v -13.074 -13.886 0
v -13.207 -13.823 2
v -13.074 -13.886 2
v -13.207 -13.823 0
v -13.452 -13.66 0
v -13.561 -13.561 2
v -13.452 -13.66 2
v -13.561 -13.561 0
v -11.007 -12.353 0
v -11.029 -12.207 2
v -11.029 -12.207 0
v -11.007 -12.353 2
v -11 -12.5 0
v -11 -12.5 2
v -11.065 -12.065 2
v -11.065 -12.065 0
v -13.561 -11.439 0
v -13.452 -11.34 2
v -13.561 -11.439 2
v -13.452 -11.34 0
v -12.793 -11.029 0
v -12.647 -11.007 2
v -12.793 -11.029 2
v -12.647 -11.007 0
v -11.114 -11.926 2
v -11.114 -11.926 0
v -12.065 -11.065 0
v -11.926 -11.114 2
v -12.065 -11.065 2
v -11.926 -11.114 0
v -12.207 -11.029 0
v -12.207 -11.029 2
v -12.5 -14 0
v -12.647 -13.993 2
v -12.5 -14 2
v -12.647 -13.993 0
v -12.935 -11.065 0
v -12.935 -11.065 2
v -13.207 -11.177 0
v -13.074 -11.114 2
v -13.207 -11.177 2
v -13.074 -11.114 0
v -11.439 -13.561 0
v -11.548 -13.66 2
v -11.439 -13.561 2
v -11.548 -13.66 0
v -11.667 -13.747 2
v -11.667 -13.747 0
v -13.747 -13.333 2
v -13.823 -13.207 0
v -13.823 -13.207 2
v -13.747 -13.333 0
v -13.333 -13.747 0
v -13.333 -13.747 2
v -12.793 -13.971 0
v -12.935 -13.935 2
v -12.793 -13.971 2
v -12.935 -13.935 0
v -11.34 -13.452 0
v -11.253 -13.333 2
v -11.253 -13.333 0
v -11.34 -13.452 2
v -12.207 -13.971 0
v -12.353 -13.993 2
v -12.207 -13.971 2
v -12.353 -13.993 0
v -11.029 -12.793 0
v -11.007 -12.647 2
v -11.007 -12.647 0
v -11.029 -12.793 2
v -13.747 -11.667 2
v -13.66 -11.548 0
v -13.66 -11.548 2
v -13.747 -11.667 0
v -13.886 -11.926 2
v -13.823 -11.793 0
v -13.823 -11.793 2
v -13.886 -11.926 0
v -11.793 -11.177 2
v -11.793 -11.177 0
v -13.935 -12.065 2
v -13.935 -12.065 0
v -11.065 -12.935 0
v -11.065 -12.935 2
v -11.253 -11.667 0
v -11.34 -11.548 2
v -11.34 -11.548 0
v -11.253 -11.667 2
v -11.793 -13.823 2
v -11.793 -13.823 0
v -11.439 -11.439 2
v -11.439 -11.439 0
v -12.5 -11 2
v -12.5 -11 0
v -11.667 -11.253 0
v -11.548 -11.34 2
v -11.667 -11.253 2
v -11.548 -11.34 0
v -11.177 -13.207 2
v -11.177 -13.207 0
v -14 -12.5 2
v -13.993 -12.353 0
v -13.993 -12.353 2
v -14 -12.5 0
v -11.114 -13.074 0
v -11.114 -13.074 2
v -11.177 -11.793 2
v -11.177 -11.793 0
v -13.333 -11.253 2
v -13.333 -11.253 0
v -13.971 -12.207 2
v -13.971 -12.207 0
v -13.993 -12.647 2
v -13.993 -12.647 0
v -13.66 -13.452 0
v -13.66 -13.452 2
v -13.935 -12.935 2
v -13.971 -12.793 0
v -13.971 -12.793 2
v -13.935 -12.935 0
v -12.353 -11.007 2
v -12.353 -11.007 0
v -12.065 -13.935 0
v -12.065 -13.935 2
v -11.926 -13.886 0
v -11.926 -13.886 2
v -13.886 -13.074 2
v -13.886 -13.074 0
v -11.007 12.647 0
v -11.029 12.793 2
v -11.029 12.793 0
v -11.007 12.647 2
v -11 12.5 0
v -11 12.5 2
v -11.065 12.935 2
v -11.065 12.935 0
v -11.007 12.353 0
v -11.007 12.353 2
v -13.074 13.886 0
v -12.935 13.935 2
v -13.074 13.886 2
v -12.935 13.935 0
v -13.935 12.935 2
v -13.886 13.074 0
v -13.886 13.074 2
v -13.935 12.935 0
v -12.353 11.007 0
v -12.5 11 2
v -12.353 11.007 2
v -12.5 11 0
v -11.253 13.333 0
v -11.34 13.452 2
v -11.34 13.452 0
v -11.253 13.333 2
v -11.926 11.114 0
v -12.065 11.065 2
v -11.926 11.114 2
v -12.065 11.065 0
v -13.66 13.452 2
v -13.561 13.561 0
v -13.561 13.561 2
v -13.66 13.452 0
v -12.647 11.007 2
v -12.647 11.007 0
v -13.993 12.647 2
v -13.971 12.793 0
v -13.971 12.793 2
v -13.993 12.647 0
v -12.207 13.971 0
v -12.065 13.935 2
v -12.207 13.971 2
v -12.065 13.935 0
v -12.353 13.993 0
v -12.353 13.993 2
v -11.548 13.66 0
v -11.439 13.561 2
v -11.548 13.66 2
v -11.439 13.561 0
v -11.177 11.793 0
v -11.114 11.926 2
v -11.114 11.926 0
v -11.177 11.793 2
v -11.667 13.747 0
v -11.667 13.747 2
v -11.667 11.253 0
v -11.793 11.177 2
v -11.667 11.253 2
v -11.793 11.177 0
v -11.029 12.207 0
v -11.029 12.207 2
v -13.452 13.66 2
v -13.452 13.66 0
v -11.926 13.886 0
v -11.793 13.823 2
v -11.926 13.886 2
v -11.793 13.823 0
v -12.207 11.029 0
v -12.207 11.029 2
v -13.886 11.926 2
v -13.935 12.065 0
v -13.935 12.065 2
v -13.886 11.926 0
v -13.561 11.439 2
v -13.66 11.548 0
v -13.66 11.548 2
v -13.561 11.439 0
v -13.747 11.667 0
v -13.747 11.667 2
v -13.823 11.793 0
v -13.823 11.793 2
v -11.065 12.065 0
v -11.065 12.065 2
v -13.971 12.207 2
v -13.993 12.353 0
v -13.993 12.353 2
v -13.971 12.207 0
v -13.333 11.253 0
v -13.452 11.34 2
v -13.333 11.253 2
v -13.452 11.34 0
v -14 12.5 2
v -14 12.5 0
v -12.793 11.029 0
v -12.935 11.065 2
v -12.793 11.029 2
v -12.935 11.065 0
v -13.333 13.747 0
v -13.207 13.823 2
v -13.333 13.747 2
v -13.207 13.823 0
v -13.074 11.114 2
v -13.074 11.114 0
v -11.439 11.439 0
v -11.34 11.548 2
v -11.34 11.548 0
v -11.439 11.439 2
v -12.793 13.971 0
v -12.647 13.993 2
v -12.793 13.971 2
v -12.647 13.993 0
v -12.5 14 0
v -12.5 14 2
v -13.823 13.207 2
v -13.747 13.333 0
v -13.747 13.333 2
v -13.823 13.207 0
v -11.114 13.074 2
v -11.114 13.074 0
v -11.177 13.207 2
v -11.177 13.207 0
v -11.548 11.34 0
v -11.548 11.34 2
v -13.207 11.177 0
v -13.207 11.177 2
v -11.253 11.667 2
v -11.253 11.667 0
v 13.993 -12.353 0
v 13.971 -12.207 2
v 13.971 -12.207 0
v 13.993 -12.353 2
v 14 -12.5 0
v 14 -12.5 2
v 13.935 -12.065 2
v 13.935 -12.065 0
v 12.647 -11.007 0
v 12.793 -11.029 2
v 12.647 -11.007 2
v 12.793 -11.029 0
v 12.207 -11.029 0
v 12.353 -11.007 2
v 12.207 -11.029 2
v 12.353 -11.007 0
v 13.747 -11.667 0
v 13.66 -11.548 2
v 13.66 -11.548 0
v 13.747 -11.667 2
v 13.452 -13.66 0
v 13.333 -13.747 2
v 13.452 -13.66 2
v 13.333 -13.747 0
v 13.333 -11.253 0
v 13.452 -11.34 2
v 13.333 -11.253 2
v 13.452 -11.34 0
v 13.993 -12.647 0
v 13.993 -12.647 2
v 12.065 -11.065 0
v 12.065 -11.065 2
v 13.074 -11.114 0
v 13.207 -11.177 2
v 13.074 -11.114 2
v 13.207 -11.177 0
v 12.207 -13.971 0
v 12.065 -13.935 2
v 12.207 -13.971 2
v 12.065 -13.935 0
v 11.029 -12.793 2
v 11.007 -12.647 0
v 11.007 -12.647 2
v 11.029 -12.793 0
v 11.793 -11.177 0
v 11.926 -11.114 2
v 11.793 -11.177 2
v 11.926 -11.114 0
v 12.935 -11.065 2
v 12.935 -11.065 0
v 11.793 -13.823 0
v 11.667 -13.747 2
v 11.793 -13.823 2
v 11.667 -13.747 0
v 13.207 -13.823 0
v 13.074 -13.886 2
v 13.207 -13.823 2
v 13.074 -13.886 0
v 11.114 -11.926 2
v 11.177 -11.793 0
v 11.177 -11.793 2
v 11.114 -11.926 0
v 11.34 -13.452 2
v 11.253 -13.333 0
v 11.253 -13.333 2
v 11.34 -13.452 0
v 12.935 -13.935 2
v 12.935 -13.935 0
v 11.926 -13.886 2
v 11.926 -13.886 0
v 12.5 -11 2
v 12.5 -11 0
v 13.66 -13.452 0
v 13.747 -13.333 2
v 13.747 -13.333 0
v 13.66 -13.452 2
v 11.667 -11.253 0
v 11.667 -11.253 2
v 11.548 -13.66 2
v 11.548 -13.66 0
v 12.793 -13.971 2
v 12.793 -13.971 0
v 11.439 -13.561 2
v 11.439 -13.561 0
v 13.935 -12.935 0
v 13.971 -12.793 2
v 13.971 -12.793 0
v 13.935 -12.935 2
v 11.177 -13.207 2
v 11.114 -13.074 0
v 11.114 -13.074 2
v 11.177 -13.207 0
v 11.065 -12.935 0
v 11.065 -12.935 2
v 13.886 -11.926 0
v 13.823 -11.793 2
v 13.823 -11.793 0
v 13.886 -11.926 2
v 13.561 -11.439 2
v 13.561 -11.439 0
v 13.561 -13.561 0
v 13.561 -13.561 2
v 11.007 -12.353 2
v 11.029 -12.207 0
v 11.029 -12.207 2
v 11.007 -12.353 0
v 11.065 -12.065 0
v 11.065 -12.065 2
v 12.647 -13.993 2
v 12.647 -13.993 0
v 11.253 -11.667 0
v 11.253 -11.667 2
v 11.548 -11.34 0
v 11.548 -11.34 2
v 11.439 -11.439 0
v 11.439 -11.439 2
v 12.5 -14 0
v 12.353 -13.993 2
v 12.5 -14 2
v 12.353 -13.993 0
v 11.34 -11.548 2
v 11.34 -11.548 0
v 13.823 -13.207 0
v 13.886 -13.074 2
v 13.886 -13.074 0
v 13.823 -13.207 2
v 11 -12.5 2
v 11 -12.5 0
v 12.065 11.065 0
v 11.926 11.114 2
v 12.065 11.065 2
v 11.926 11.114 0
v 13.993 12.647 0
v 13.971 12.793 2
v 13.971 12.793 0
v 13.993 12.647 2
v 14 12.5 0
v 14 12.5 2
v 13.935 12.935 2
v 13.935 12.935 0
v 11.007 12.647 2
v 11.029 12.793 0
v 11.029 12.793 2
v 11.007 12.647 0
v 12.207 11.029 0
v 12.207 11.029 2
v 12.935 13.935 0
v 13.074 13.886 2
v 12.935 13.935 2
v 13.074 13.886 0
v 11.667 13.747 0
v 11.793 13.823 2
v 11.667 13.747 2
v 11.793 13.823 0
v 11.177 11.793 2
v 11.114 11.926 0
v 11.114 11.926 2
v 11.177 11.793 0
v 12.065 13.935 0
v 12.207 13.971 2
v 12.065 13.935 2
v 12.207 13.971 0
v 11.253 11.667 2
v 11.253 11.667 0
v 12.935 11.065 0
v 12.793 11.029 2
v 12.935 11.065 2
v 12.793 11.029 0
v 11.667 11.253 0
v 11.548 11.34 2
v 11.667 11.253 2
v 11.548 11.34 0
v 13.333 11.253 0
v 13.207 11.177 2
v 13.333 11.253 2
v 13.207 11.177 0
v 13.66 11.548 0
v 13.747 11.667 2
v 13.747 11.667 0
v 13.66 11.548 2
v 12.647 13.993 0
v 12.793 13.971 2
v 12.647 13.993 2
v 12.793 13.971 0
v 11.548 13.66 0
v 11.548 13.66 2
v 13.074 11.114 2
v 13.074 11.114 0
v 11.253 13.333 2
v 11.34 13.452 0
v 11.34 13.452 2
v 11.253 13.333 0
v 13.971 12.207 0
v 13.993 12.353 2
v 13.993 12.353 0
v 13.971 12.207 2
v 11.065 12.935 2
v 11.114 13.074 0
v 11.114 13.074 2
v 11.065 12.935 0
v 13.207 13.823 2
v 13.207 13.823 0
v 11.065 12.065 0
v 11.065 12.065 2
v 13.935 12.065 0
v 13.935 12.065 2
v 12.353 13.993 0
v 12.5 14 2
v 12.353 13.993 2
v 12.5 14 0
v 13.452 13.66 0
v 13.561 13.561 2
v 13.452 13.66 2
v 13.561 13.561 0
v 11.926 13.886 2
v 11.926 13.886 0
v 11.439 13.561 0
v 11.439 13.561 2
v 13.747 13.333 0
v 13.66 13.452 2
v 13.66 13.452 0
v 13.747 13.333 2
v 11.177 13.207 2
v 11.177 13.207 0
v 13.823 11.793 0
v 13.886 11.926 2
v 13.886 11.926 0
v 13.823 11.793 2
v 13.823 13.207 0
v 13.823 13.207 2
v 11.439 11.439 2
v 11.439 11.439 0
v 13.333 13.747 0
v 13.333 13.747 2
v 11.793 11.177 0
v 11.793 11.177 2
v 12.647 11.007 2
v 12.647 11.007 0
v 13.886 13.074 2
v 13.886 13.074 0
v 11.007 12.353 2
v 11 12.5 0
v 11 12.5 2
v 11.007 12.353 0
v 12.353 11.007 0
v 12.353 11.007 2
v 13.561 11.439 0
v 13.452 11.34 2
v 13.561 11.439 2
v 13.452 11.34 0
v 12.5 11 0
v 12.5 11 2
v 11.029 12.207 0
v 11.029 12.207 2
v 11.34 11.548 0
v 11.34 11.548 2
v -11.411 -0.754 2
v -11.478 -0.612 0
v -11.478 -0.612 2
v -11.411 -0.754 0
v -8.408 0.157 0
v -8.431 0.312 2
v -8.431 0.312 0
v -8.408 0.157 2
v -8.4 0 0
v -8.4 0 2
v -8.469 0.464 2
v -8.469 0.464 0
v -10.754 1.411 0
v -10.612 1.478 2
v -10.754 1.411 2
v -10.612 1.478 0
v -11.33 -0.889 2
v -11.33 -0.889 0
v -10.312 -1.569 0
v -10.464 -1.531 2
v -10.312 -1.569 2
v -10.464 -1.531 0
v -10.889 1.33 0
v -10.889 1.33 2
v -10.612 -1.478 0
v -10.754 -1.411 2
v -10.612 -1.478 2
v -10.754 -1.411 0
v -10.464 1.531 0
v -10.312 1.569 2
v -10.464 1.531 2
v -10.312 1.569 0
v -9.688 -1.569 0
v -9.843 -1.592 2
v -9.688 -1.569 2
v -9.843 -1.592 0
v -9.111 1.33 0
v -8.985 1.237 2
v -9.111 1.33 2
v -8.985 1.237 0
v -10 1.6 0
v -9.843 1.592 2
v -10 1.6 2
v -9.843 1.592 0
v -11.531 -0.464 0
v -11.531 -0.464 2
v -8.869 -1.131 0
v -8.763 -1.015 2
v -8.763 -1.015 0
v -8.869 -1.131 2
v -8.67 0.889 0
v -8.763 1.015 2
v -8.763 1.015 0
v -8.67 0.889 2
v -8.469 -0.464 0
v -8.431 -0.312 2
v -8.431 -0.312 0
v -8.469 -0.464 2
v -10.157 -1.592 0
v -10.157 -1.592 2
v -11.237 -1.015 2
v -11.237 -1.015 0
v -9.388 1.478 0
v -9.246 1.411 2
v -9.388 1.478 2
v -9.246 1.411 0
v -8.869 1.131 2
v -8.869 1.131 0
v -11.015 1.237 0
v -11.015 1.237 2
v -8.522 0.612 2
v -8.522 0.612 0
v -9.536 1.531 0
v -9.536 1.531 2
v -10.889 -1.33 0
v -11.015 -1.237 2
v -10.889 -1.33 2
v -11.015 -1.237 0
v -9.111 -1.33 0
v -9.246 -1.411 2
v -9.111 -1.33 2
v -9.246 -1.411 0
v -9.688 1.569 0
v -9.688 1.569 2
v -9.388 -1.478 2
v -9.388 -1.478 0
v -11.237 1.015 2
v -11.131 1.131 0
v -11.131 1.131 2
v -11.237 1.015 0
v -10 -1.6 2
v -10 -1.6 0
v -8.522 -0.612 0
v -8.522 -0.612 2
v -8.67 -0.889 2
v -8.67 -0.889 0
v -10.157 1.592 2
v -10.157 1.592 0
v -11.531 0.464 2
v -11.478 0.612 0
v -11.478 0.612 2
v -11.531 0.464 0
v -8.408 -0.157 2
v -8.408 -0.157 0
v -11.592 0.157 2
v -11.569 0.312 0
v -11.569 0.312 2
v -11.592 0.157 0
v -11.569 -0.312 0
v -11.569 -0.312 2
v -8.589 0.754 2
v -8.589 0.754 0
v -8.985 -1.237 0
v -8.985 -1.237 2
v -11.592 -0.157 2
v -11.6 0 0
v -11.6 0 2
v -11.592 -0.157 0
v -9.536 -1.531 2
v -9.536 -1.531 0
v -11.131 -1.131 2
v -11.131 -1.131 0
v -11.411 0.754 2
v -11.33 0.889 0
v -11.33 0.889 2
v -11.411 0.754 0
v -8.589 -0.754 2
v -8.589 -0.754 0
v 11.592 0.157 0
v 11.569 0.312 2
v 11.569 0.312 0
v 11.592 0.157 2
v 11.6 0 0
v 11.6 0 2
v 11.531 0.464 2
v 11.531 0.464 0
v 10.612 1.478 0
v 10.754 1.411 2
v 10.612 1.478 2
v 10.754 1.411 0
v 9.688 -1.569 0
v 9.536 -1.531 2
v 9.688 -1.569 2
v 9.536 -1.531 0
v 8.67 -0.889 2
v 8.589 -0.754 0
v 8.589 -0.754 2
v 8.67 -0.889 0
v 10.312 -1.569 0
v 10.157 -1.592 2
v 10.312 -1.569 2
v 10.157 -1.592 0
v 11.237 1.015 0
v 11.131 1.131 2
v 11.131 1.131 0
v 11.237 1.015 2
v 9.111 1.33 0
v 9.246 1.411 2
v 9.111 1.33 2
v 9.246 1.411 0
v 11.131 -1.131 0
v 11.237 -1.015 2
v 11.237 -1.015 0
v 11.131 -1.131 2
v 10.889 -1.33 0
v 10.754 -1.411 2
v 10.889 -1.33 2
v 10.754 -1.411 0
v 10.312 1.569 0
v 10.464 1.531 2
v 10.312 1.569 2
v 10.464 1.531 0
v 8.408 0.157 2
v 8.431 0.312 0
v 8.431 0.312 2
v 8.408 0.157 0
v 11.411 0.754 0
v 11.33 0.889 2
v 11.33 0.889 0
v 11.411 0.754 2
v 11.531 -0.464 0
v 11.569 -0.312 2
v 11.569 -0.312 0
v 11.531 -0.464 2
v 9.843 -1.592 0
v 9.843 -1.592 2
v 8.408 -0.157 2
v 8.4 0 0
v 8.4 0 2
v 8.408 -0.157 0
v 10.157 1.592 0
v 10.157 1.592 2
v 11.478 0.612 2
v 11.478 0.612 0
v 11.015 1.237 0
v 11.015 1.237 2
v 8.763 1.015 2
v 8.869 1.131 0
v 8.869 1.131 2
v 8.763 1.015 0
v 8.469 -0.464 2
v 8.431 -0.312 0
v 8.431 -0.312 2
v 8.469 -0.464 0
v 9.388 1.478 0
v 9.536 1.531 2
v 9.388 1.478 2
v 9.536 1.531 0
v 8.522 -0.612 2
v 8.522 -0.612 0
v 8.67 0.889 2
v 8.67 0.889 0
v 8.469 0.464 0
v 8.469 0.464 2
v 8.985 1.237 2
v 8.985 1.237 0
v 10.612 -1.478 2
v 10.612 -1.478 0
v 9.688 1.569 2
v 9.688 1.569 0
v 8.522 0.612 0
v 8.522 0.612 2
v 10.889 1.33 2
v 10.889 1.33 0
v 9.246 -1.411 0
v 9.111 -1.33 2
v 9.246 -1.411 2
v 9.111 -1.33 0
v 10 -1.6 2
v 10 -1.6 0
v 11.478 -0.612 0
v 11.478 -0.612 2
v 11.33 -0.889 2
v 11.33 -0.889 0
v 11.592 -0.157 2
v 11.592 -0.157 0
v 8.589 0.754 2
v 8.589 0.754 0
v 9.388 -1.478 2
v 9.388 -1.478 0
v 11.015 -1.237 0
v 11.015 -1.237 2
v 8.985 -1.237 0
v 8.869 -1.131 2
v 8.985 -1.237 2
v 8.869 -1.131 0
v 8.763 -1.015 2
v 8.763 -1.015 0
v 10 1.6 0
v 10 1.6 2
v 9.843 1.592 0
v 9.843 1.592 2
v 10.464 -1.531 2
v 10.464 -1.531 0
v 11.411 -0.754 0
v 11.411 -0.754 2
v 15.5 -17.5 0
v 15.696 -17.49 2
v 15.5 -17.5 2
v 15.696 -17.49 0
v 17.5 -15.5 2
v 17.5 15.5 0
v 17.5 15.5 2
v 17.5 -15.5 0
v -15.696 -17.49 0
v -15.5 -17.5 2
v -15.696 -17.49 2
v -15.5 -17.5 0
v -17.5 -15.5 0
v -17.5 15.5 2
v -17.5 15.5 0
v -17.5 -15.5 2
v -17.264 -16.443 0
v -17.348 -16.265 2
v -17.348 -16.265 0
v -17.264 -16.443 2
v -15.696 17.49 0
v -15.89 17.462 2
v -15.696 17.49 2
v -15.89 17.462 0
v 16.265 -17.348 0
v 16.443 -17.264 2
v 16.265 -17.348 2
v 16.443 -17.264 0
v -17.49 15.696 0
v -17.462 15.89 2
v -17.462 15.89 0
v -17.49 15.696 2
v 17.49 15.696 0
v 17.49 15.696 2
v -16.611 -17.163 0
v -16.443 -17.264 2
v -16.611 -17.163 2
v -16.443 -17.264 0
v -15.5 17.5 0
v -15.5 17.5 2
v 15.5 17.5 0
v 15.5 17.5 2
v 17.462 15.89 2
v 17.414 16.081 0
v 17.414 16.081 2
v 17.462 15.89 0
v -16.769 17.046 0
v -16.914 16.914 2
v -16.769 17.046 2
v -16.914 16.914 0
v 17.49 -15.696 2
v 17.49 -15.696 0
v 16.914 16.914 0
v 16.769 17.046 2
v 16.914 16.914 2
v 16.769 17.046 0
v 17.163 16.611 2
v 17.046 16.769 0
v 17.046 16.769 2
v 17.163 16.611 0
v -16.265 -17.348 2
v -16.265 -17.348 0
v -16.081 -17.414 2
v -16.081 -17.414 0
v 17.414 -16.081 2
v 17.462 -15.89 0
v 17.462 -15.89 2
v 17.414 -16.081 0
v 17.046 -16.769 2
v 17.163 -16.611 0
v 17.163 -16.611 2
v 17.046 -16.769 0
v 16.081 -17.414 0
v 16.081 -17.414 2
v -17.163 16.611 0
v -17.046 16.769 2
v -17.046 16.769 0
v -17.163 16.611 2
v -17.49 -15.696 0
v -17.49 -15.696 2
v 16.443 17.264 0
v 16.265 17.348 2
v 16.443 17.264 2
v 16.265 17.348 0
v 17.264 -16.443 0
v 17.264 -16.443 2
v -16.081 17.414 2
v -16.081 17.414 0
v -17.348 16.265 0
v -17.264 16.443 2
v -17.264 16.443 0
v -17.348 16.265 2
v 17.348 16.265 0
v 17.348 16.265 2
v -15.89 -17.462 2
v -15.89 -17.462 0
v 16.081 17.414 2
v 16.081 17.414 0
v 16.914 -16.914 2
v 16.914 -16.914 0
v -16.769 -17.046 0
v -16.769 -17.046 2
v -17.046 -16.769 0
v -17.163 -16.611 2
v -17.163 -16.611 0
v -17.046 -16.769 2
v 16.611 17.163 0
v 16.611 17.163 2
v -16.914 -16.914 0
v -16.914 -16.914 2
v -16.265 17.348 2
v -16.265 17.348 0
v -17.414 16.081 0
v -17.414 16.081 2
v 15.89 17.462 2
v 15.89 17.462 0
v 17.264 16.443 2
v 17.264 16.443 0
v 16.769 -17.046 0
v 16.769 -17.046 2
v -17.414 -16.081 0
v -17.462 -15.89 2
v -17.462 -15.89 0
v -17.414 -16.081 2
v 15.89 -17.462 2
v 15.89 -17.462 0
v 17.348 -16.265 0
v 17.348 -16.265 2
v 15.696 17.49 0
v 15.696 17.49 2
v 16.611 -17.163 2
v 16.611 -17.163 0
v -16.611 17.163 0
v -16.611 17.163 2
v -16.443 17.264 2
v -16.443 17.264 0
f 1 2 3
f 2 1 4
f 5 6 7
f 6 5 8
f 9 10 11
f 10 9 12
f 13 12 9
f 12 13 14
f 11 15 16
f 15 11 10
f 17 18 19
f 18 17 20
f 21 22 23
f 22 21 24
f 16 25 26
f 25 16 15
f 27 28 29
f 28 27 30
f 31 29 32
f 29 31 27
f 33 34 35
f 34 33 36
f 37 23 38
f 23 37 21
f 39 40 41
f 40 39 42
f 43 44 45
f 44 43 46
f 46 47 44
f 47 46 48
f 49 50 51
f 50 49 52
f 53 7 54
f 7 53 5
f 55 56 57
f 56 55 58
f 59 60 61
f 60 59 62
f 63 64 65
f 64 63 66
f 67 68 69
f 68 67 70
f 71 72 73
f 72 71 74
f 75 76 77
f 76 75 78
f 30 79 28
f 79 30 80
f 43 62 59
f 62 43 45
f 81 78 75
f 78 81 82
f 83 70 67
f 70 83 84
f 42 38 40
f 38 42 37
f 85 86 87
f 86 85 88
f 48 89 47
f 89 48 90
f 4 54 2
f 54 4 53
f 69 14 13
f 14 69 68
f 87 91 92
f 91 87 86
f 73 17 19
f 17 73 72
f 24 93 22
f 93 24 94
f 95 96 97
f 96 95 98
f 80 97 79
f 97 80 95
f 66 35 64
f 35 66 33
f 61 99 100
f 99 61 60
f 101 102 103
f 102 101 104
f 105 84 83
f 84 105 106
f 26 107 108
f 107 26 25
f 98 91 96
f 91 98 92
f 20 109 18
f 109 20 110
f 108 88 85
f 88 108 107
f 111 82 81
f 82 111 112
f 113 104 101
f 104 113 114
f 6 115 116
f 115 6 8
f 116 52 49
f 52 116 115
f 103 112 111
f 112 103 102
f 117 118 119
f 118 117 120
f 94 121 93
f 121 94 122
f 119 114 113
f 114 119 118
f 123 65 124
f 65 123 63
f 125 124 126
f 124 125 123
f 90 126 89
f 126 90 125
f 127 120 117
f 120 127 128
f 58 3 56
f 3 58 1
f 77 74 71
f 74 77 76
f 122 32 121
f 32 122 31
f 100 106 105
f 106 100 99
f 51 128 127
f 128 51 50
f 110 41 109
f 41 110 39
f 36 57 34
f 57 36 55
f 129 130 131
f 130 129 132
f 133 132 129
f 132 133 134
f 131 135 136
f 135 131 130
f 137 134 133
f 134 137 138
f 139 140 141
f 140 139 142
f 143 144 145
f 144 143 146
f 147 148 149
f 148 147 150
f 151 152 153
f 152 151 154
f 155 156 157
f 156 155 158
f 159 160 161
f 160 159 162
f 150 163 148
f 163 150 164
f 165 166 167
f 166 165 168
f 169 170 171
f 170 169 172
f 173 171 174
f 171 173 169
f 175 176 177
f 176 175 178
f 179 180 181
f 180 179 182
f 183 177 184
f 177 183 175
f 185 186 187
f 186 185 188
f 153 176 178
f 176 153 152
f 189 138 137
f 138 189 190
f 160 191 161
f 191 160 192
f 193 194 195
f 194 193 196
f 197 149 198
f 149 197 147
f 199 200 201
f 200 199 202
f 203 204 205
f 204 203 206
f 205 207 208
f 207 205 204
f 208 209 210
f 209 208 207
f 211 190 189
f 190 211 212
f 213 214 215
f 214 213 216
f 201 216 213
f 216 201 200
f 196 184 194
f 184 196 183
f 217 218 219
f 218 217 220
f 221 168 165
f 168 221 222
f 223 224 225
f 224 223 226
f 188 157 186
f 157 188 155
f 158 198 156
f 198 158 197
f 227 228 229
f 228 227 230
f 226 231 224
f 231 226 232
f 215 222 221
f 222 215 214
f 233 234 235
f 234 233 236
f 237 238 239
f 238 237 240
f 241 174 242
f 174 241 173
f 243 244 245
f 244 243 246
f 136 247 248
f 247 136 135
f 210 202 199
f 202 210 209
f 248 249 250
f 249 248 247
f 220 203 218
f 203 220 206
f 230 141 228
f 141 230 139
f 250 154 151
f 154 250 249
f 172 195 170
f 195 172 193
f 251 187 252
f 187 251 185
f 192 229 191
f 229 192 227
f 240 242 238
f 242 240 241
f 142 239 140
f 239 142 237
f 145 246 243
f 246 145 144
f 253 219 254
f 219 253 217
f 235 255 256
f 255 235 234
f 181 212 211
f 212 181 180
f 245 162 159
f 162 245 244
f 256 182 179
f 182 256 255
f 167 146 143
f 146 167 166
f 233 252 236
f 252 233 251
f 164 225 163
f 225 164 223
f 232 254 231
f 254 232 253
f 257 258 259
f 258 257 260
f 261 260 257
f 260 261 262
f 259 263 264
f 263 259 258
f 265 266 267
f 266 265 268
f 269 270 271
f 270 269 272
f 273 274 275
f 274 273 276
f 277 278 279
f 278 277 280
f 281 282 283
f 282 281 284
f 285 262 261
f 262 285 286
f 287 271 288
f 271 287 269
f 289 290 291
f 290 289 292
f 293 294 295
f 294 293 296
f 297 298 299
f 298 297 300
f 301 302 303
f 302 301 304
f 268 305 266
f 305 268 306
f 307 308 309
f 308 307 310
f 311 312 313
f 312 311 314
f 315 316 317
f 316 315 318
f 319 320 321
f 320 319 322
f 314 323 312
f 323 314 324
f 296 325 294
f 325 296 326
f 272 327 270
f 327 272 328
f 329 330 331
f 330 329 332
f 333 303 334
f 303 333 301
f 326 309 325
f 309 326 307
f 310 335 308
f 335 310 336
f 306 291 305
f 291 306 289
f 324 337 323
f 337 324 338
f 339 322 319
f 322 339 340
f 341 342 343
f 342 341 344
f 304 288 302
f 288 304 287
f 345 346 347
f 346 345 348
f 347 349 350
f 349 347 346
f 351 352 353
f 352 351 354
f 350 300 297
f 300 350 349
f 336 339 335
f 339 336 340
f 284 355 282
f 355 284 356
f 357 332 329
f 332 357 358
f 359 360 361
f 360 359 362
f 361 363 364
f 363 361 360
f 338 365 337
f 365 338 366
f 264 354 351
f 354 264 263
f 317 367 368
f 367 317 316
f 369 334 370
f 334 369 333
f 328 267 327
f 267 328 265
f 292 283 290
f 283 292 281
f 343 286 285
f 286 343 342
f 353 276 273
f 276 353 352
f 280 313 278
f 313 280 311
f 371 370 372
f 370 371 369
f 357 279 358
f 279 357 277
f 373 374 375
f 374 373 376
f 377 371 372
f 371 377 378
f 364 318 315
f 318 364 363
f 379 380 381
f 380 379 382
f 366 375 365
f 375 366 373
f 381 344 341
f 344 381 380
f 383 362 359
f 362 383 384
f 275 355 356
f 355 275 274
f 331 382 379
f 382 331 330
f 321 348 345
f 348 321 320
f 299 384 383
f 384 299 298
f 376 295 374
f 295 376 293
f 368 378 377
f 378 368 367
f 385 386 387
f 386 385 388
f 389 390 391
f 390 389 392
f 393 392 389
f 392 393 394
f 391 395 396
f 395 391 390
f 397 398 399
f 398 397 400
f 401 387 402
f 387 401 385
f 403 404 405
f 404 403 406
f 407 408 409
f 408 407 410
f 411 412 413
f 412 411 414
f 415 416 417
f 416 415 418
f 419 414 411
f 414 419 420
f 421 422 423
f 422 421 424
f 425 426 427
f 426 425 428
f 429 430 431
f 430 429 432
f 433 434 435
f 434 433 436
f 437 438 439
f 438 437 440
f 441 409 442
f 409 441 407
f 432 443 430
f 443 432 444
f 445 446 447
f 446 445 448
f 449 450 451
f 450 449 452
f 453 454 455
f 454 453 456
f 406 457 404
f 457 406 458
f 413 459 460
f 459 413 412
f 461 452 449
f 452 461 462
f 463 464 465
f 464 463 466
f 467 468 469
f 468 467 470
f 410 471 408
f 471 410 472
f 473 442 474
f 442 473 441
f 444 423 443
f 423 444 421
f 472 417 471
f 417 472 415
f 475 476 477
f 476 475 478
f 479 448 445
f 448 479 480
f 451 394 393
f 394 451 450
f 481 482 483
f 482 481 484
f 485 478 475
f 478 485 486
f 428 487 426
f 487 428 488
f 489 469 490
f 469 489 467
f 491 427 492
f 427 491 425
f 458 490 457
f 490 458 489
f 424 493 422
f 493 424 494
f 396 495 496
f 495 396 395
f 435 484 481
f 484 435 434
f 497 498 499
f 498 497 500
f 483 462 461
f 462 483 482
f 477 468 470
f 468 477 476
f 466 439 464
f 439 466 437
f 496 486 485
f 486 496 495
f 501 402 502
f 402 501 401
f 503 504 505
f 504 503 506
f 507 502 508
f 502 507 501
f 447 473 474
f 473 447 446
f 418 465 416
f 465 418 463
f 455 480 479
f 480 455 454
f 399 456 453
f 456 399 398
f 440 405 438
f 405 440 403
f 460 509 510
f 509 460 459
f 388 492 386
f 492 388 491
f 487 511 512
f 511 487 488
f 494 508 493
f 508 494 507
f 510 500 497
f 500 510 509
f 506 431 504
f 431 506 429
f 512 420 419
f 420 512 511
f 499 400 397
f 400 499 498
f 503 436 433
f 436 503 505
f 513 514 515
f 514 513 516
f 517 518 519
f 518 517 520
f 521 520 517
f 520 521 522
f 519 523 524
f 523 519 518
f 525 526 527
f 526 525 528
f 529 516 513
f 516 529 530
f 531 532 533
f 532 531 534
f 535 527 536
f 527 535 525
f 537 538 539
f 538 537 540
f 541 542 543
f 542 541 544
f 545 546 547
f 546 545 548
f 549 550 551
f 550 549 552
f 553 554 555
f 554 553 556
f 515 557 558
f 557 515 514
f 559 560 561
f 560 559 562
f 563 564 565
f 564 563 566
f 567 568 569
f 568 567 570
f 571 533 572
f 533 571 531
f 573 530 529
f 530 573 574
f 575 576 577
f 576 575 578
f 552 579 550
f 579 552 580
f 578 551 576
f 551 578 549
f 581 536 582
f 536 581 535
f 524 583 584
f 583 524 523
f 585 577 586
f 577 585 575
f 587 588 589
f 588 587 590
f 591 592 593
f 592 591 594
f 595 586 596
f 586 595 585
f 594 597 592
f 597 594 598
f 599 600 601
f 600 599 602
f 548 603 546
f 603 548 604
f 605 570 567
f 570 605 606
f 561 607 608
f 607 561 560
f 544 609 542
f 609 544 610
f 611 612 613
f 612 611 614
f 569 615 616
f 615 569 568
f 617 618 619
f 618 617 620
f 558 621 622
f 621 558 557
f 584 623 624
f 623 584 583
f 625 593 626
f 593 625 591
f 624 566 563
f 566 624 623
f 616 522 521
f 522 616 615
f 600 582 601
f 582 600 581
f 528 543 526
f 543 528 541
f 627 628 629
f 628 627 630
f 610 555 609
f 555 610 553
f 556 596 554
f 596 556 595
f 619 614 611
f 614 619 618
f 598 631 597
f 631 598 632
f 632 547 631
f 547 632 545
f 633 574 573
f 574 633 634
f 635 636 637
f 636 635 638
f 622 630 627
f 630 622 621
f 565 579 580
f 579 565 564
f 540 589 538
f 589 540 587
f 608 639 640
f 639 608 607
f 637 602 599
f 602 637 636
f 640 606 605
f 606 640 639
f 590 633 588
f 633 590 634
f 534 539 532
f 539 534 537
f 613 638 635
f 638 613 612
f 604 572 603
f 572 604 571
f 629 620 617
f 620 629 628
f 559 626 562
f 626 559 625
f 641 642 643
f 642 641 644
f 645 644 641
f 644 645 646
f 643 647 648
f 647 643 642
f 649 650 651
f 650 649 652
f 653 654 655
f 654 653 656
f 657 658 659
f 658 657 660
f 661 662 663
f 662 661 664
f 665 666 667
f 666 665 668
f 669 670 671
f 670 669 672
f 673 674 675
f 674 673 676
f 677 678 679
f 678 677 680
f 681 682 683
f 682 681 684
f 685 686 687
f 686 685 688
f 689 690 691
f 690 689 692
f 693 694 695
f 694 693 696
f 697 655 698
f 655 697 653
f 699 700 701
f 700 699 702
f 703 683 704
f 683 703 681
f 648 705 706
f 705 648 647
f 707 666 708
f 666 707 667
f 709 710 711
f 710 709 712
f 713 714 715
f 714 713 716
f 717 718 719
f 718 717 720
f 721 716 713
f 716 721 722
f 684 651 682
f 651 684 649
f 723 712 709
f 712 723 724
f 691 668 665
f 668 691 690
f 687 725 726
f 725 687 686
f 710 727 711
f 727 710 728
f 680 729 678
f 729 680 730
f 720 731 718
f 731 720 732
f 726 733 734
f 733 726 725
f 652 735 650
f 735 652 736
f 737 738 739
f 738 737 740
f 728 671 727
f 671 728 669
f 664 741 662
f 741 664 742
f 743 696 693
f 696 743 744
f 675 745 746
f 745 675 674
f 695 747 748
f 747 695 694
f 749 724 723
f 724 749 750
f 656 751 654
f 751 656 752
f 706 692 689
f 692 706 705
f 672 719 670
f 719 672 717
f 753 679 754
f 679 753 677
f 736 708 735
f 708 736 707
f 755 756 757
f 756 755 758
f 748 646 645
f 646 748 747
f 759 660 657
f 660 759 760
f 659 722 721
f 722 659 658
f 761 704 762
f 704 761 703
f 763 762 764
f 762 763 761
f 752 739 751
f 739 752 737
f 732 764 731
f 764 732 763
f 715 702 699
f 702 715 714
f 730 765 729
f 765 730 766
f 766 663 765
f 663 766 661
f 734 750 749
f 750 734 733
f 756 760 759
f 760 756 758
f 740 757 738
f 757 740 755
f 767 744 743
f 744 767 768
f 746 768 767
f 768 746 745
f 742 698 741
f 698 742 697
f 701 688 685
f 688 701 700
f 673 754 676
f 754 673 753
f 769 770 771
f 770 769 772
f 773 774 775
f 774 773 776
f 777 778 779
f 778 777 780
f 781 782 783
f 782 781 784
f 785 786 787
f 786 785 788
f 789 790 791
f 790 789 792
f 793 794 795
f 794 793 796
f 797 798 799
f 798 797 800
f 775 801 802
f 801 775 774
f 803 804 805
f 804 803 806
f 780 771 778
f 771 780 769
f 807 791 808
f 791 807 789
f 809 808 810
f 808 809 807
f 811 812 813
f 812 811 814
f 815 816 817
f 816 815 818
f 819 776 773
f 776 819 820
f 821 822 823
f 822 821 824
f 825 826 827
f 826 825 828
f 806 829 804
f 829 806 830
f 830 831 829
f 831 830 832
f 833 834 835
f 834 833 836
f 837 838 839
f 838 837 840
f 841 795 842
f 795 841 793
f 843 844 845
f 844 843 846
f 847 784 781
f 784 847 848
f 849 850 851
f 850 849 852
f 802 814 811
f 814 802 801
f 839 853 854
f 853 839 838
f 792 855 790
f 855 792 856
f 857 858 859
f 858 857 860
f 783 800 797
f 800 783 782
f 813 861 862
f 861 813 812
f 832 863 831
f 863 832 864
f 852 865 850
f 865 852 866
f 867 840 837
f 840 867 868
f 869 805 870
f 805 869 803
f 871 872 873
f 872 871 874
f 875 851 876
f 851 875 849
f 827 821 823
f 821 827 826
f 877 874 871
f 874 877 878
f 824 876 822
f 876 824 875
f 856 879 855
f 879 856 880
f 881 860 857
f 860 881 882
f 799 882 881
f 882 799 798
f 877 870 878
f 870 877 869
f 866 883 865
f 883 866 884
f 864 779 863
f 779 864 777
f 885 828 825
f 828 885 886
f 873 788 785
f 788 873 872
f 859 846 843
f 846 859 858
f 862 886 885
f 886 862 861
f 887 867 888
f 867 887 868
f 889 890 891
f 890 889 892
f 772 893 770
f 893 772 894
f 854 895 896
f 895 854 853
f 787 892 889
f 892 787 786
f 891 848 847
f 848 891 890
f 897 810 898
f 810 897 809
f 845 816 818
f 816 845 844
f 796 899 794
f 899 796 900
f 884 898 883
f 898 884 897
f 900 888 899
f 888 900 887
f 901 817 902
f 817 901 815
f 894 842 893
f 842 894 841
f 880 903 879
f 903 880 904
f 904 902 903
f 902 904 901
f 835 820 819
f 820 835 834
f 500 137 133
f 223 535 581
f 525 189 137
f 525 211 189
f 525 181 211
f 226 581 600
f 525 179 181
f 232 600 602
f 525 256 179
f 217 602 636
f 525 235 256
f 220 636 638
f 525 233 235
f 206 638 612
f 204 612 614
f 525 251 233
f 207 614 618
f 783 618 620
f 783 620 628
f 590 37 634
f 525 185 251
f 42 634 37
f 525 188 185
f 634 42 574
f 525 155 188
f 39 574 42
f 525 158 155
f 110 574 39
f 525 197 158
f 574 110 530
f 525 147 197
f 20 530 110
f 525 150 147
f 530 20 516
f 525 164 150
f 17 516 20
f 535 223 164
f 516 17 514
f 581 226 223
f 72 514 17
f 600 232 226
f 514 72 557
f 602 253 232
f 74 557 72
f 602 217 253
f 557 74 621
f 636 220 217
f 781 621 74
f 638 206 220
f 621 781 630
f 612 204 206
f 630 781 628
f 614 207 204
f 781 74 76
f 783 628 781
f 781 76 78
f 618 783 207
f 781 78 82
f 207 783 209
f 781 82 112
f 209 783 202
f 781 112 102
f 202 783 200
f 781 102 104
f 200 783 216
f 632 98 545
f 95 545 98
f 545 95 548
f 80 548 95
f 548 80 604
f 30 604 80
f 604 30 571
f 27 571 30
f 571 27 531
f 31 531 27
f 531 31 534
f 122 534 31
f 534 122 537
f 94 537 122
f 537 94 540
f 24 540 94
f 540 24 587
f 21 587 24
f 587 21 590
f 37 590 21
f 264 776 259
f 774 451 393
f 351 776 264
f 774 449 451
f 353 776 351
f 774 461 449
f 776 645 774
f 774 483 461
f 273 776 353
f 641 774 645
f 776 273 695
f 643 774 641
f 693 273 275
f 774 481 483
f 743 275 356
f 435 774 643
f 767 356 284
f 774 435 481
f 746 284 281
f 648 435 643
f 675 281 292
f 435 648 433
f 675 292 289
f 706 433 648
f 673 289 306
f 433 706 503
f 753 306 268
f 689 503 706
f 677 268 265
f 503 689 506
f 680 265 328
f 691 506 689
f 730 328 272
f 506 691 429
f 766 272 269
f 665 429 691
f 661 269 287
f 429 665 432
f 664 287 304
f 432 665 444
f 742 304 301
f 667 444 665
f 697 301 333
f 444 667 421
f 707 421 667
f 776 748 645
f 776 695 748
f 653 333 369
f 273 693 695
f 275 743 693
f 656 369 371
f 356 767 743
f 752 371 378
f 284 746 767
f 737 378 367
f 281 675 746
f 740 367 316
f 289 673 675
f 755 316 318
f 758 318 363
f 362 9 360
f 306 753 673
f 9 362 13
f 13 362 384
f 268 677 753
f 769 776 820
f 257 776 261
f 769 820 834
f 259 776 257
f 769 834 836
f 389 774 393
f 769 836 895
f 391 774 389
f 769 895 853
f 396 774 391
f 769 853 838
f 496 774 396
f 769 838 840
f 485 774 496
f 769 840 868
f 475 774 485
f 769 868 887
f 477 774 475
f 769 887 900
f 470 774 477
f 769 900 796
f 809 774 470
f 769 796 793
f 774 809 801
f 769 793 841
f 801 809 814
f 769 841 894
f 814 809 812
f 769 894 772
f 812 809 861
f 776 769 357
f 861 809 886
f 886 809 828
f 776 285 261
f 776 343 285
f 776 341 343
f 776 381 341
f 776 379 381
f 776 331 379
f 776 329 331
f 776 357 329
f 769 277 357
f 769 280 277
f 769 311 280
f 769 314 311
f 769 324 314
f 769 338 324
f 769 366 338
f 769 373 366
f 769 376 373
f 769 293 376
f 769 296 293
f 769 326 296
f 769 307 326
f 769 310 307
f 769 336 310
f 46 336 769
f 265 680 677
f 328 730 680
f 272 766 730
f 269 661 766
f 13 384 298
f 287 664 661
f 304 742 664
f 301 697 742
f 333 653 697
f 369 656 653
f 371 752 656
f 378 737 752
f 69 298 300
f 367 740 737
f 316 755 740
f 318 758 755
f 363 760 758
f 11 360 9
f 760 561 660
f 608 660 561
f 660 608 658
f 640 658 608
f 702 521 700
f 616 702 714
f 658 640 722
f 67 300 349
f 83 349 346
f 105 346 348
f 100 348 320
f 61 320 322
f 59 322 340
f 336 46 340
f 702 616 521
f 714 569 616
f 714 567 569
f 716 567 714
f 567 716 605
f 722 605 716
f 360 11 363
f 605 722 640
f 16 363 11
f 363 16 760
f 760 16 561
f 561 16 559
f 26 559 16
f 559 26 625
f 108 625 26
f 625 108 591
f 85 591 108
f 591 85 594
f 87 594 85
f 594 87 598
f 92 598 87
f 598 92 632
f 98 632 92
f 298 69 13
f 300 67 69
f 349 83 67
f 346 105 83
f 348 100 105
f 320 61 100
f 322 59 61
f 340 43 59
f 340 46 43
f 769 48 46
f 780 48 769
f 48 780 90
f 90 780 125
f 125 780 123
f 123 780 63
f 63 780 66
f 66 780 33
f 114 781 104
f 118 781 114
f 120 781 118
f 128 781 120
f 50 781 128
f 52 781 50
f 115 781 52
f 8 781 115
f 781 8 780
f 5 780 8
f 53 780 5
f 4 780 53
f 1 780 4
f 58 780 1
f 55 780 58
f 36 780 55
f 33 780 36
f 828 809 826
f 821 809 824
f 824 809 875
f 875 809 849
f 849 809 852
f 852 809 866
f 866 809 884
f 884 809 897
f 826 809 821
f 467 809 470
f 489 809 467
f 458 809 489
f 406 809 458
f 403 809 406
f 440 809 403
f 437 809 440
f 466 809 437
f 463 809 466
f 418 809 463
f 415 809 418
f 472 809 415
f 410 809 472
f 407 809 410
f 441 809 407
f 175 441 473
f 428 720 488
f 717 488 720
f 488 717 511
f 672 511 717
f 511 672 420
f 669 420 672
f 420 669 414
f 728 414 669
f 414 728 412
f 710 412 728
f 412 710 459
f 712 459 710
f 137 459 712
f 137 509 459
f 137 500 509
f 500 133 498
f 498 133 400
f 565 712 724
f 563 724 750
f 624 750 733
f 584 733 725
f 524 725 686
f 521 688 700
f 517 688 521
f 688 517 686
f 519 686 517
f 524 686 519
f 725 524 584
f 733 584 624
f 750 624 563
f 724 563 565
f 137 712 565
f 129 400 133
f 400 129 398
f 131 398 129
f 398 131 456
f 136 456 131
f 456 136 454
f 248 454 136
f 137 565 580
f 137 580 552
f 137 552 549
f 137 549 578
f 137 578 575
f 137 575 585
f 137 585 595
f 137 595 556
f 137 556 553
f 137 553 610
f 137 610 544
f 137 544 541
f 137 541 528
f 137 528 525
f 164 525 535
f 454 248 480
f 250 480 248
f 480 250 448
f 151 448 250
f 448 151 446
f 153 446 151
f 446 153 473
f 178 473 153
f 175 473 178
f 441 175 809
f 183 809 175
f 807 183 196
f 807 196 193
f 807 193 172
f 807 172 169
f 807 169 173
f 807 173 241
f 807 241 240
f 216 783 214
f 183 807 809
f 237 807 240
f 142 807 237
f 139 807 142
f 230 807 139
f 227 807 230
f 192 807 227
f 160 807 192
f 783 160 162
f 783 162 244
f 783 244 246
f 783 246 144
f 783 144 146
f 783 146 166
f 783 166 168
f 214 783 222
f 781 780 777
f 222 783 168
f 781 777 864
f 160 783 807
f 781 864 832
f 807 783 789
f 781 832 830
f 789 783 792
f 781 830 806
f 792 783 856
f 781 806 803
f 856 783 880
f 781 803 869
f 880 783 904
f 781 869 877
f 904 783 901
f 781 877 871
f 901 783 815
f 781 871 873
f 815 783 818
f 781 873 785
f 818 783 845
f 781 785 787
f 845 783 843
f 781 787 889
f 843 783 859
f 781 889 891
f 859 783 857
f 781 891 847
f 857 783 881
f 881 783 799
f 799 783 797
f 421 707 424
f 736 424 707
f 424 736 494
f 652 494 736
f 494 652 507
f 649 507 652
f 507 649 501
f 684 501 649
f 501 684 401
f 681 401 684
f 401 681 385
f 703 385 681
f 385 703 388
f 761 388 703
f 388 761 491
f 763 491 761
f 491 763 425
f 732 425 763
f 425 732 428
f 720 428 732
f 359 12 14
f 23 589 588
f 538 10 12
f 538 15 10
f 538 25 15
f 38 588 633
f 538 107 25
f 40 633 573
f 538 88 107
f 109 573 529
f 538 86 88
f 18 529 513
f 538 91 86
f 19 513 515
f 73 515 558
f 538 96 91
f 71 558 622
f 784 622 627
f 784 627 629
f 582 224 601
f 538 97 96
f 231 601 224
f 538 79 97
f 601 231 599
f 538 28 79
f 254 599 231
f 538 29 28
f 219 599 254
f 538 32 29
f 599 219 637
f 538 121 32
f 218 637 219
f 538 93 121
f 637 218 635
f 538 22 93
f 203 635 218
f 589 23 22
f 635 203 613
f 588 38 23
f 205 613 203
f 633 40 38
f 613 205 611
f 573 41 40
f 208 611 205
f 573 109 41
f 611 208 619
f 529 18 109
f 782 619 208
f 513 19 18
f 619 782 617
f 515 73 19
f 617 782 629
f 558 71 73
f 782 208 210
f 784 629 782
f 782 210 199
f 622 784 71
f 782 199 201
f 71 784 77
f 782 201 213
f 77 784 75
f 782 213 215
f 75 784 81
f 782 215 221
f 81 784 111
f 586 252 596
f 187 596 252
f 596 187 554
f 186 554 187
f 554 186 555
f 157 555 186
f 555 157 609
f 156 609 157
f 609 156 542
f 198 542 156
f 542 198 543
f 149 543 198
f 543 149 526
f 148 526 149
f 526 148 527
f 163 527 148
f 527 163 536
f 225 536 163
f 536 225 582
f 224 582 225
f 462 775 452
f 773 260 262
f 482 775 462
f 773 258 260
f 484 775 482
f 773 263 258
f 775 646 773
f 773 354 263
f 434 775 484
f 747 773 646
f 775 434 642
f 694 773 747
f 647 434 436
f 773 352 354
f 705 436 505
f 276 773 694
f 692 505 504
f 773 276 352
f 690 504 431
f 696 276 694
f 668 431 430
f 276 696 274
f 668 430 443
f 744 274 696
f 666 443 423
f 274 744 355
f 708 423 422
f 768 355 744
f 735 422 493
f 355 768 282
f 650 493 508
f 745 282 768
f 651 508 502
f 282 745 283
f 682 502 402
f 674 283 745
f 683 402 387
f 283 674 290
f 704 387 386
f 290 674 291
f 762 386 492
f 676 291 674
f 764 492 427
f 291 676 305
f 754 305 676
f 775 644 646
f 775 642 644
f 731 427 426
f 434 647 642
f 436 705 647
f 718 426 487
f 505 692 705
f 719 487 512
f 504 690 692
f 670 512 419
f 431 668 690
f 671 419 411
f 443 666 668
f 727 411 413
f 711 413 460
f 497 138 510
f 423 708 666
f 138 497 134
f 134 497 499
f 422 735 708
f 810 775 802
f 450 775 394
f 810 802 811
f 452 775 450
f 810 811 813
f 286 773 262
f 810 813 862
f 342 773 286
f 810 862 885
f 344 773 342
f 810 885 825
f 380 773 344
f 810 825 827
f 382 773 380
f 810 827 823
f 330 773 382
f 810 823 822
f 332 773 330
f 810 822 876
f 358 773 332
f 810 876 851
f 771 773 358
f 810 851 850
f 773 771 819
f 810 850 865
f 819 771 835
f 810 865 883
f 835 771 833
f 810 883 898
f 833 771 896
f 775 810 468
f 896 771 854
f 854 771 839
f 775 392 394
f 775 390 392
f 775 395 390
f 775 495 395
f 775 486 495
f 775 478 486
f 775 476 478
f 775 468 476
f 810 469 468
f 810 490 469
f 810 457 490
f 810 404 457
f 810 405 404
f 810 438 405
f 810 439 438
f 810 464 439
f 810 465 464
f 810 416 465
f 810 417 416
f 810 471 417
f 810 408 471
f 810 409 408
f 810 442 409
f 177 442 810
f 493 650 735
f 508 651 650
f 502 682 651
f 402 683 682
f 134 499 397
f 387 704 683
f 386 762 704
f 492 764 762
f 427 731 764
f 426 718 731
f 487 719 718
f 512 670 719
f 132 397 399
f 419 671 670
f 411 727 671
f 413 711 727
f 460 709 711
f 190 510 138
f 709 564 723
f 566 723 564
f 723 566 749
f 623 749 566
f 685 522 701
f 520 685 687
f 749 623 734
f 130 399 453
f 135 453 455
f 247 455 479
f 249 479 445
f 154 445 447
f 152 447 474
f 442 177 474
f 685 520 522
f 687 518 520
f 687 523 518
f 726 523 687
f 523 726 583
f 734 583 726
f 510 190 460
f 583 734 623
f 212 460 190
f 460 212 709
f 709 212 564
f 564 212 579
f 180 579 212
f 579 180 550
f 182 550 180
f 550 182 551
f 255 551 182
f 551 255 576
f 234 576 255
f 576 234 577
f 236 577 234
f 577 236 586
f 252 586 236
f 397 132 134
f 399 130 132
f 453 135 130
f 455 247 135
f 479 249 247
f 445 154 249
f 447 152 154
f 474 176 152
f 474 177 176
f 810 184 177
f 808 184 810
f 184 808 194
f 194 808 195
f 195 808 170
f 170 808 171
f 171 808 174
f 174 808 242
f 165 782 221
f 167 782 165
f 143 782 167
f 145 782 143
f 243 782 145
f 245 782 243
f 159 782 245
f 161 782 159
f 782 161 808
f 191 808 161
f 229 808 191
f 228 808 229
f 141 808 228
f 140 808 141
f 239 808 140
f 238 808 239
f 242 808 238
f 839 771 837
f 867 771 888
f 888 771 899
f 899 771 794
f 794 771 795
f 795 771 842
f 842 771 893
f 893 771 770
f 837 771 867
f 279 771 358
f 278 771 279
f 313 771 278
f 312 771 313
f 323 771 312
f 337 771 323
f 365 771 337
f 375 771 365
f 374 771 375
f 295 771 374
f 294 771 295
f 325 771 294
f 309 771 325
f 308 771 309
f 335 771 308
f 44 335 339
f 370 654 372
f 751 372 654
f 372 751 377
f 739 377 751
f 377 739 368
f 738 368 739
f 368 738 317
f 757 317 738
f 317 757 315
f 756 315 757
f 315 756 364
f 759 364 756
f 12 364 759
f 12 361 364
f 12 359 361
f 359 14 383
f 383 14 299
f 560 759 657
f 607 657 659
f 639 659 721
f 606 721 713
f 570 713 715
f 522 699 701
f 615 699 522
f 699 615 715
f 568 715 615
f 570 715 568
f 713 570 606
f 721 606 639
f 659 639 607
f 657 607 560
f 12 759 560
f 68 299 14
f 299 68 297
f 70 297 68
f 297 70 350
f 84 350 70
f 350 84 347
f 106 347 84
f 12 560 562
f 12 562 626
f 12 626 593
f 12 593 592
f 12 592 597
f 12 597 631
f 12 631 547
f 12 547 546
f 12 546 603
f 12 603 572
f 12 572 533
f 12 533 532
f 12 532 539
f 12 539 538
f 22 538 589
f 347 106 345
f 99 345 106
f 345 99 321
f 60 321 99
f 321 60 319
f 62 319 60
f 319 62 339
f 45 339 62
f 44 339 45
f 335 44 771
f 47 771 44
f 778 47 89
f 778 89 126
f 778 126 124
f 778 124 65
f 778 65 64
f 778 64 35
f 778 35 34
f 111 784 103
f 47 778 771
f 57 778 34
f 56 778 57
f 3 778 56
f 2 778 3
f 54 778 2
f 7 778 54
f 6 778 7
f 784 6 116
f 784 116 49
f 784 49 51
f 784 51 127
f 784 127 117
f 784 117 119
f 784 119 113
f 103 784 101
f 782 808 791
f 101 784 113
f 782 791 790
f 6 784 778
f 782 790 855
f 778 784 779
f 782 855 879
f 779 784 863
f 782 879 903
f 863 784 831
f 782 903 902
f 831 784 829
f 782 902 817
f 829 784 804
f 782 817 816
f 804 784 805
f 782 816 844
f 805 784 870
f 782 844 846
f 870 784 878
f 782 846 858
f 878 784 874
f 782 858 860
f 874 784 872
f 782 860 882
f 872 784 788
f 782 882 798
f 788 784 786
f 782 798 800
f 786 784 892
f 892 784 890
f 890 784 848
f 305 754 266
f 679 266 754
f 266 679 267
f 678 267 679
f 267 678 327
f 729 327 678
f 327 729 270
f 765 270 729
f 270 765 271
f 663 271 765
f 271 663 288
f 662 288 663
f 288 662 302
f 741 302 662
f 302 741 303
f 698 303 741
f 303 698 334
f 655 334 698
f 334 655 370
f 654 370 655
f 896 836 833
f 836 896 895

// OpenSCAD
// file: ../lib/util.scad
// =============================================================================
// lib/util.scad — reusable 2D/3D helpers. All "cutter" modules are sized to
// over-shoot in Z so callers can subtract them cleanly; callers position them.
// Self-contained: `use <util.scad>` imports only modules, not variables, so we
// define our own over-cut constant here rather than relying on params.scad.
// =============================================================================

eps = 0.05;   // local over-cut for clean boolean subtractions

// ---- 2D primitives ----------------------------------------------------------

// Rounded rectangle centered at origin. r=0 -> sharp corners.
module rounded_rect(w, d, r = 0) {
    if (r > 0)
        offset(r = r) square([max(0.01, w - 2*r), max(0.01, d - 2*r)], center = true);
    else
        square([w, d], center = true);
}

// Isosceles trapezoid centered at origin: width w1 at the -X end, w2 at the +X
// end, length l along X. Used for the dovetail arm root + its mating pocket so
// the two always share one profile (call with +clearance for the pocket).
module trapezoid_2d(w1, w2, l) {
    polygon([[-l/2, -w1/2], [-l/2, w1/2], [l/2, w2/2], [l/2, -w2/2]]);
}

// Stadium slot: length l along X, width w along Y, fully rounded ends.
module slot_2d(l, w) {
    r = w / 2;
    hull() {
        translate([-(l/2 - r), 0]) circle(r = r);
        translate([ (l/2 - r), 0]) circle(r = r);
    }
}

// Inset-fillet a 2D shape: rounds BOTH convex and concave corners by radius r.
// Used for the arm root where the body blends into the clamp pad.
module fillet_2d(r) {
    offset(r = r) offset(delta = -r) children();
}

// ---- 3D solids --------------------------------------------------------------

// Flat plate: rounded rectangle, centered in XY, base on z=0.
module rounded_plate(w, d, h, r = 0) {
    linear_extrude(height = h) rounded_rect(w, d, r);
}

// ---- Cutters (subtract these) ----------------------------------------------

// Single through-hole, base on z=0, height h (caller lifts by -eps and pads h).
module hole(d, h) {
    translate([0, 0, -eps]) cylinder(d = d, h = h + 2*eps);
}

// 4-hole rectangular bolt pattern, spacing dx by dy, through a part of height h.
module bolt_grid(dx, dy, d, h) {
    for (x = [-dx/2, dx/2], y = [-dy/2, dy/2])
        translate([x, y, 0]) hole(d, h);
}

// 2-hole pair separated by `sep` along X (used for arm clamp / mast / cam).
module bolt_pair(sep, d, h) {
    for (x = [-sep/2, sep/2]) translate([x, 0, 0]) hole(d, h);
}

// Rounded-end through slot, length l along X.
module slot_cut(l, w, h) {
    translate([0, 0, -eps]) linear_extrude(height = h + 2*eps) slot_2d(l, w);
}

// Rectangular through cutout (window / strap slot), optional corner radius.
module rect_cut(l, w, h, r = 0) {
    translate([0, 0, -eps]) linear_extrude(height = h + 2*eps) rounded_rect(l, w, r);
}

// Shallow rectangular pocket cut DOWNWARD from the top face at z = top_z.
module pocket(l, w, depth, top_z, r = 0) {
    translate([0, 0, top_z - depth])
        linear_extrude(height = depth + eps) rounded_rect(l, w, r);
}

// Recess an arbitrary 2D child profile DOWN from the top face at z = top_z.
module recess_top(depth, top_z) {
    translate([0, 0, top_z - depth])
        linear_extrude(height = depth + eps) children();
}

// Recess an arbitrary 2D child profile UP from the bottom face (z = 0).
module recess_bottom(depth) {
    translate([0, 0, -eps])
        linear_extrude(height = depth + eps) children();
}

// Sensor-board seat: a rounded recess (captures the board by geometry, matching
// its rounded corners) plus two through mounting holes on the centerline.
// Subtract from a carrier of total thickness `h_total`, top face at `top_z`.
module board_cradle(l, w, r, depth, top_z, hole_d, hole_sep, h_total) {
    recess_top(depth, top_z) rounded_rect(l, w, r);
    for (x = [-hole_sep/2, hole_sep/2]) translate([x, 0, 0]) hole(hole_d, h_total);
}
// main file
// Part 6a — IMU Vibration Mount, Lower (Damper) Plate
// 35 x 35 x 2. Bolts to the stack; carries the 4 silicone damper balls on a
// 25 x 25 pattern. Floating plate (Part 6b) sits above on the same dampers.
include <../params.scad>
use <../lib/util.scad>

module imu_lower_plate() {
    difference() {
        rounded_plate(imu_lower, imu_lower, imu_mount_t, slot_corner_r);

        // Damper-ball holes
        bolt_grid(damper_pattern, damper_pattern, damper_hole, imu_mount_t);

        // 2x M3 to bolt the plate down to the stack
        bolt_pair(imu_stack_sep, m3_clear, imu_mount_t);
    }
}

imu_lower_plate();
